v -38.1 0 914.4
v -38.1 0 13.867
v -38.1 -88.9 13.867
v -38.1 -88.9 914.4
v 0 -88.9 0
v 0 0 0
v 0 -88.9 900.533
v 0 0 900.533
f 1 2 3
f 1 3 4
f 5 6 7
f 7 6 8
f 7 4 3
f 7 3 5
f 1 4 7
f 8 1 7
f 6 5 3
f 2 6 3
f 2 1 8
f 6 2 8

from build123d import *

# Parameters (mm, degrees)
F0_W     = 38.1
F0_H     = 914.4
F1_DEPTH = 88.9
F3_DEPTH = 88.9
F5_DEPTH = 88.9


with BuildPart() as f1:
    # F0 (on Front) → F1 (new body)
    with BuildSketch(Plane.XZ):
        with Locations((-19.05, 457.2)):
            Rectangle(F0_W, F0_H)
    extrude(amount=F1_DEPTH)

    # F2 (on face) → F3 (cut)
    with BuildSketch(Plane.XZ.offset(88.9)):
        Polygon((0, 914.4), (-38.1, 914.4), (0, 900.532734), align=None)
    extrude(amount=-F3_DEPTH, mode=Mode.SUBTRACT)

    # F4 (on face) → F5 (cut)
    with BuildSketch(Plane.XZ.offset(88.9)):
        Polygon((-38.1, 0), (0, 0), (-38.1, 13.867266), align=None)
    extrude(amount=-F5_DEPTH, mode=Mode.SUBTRACT)


solid = f1.part
